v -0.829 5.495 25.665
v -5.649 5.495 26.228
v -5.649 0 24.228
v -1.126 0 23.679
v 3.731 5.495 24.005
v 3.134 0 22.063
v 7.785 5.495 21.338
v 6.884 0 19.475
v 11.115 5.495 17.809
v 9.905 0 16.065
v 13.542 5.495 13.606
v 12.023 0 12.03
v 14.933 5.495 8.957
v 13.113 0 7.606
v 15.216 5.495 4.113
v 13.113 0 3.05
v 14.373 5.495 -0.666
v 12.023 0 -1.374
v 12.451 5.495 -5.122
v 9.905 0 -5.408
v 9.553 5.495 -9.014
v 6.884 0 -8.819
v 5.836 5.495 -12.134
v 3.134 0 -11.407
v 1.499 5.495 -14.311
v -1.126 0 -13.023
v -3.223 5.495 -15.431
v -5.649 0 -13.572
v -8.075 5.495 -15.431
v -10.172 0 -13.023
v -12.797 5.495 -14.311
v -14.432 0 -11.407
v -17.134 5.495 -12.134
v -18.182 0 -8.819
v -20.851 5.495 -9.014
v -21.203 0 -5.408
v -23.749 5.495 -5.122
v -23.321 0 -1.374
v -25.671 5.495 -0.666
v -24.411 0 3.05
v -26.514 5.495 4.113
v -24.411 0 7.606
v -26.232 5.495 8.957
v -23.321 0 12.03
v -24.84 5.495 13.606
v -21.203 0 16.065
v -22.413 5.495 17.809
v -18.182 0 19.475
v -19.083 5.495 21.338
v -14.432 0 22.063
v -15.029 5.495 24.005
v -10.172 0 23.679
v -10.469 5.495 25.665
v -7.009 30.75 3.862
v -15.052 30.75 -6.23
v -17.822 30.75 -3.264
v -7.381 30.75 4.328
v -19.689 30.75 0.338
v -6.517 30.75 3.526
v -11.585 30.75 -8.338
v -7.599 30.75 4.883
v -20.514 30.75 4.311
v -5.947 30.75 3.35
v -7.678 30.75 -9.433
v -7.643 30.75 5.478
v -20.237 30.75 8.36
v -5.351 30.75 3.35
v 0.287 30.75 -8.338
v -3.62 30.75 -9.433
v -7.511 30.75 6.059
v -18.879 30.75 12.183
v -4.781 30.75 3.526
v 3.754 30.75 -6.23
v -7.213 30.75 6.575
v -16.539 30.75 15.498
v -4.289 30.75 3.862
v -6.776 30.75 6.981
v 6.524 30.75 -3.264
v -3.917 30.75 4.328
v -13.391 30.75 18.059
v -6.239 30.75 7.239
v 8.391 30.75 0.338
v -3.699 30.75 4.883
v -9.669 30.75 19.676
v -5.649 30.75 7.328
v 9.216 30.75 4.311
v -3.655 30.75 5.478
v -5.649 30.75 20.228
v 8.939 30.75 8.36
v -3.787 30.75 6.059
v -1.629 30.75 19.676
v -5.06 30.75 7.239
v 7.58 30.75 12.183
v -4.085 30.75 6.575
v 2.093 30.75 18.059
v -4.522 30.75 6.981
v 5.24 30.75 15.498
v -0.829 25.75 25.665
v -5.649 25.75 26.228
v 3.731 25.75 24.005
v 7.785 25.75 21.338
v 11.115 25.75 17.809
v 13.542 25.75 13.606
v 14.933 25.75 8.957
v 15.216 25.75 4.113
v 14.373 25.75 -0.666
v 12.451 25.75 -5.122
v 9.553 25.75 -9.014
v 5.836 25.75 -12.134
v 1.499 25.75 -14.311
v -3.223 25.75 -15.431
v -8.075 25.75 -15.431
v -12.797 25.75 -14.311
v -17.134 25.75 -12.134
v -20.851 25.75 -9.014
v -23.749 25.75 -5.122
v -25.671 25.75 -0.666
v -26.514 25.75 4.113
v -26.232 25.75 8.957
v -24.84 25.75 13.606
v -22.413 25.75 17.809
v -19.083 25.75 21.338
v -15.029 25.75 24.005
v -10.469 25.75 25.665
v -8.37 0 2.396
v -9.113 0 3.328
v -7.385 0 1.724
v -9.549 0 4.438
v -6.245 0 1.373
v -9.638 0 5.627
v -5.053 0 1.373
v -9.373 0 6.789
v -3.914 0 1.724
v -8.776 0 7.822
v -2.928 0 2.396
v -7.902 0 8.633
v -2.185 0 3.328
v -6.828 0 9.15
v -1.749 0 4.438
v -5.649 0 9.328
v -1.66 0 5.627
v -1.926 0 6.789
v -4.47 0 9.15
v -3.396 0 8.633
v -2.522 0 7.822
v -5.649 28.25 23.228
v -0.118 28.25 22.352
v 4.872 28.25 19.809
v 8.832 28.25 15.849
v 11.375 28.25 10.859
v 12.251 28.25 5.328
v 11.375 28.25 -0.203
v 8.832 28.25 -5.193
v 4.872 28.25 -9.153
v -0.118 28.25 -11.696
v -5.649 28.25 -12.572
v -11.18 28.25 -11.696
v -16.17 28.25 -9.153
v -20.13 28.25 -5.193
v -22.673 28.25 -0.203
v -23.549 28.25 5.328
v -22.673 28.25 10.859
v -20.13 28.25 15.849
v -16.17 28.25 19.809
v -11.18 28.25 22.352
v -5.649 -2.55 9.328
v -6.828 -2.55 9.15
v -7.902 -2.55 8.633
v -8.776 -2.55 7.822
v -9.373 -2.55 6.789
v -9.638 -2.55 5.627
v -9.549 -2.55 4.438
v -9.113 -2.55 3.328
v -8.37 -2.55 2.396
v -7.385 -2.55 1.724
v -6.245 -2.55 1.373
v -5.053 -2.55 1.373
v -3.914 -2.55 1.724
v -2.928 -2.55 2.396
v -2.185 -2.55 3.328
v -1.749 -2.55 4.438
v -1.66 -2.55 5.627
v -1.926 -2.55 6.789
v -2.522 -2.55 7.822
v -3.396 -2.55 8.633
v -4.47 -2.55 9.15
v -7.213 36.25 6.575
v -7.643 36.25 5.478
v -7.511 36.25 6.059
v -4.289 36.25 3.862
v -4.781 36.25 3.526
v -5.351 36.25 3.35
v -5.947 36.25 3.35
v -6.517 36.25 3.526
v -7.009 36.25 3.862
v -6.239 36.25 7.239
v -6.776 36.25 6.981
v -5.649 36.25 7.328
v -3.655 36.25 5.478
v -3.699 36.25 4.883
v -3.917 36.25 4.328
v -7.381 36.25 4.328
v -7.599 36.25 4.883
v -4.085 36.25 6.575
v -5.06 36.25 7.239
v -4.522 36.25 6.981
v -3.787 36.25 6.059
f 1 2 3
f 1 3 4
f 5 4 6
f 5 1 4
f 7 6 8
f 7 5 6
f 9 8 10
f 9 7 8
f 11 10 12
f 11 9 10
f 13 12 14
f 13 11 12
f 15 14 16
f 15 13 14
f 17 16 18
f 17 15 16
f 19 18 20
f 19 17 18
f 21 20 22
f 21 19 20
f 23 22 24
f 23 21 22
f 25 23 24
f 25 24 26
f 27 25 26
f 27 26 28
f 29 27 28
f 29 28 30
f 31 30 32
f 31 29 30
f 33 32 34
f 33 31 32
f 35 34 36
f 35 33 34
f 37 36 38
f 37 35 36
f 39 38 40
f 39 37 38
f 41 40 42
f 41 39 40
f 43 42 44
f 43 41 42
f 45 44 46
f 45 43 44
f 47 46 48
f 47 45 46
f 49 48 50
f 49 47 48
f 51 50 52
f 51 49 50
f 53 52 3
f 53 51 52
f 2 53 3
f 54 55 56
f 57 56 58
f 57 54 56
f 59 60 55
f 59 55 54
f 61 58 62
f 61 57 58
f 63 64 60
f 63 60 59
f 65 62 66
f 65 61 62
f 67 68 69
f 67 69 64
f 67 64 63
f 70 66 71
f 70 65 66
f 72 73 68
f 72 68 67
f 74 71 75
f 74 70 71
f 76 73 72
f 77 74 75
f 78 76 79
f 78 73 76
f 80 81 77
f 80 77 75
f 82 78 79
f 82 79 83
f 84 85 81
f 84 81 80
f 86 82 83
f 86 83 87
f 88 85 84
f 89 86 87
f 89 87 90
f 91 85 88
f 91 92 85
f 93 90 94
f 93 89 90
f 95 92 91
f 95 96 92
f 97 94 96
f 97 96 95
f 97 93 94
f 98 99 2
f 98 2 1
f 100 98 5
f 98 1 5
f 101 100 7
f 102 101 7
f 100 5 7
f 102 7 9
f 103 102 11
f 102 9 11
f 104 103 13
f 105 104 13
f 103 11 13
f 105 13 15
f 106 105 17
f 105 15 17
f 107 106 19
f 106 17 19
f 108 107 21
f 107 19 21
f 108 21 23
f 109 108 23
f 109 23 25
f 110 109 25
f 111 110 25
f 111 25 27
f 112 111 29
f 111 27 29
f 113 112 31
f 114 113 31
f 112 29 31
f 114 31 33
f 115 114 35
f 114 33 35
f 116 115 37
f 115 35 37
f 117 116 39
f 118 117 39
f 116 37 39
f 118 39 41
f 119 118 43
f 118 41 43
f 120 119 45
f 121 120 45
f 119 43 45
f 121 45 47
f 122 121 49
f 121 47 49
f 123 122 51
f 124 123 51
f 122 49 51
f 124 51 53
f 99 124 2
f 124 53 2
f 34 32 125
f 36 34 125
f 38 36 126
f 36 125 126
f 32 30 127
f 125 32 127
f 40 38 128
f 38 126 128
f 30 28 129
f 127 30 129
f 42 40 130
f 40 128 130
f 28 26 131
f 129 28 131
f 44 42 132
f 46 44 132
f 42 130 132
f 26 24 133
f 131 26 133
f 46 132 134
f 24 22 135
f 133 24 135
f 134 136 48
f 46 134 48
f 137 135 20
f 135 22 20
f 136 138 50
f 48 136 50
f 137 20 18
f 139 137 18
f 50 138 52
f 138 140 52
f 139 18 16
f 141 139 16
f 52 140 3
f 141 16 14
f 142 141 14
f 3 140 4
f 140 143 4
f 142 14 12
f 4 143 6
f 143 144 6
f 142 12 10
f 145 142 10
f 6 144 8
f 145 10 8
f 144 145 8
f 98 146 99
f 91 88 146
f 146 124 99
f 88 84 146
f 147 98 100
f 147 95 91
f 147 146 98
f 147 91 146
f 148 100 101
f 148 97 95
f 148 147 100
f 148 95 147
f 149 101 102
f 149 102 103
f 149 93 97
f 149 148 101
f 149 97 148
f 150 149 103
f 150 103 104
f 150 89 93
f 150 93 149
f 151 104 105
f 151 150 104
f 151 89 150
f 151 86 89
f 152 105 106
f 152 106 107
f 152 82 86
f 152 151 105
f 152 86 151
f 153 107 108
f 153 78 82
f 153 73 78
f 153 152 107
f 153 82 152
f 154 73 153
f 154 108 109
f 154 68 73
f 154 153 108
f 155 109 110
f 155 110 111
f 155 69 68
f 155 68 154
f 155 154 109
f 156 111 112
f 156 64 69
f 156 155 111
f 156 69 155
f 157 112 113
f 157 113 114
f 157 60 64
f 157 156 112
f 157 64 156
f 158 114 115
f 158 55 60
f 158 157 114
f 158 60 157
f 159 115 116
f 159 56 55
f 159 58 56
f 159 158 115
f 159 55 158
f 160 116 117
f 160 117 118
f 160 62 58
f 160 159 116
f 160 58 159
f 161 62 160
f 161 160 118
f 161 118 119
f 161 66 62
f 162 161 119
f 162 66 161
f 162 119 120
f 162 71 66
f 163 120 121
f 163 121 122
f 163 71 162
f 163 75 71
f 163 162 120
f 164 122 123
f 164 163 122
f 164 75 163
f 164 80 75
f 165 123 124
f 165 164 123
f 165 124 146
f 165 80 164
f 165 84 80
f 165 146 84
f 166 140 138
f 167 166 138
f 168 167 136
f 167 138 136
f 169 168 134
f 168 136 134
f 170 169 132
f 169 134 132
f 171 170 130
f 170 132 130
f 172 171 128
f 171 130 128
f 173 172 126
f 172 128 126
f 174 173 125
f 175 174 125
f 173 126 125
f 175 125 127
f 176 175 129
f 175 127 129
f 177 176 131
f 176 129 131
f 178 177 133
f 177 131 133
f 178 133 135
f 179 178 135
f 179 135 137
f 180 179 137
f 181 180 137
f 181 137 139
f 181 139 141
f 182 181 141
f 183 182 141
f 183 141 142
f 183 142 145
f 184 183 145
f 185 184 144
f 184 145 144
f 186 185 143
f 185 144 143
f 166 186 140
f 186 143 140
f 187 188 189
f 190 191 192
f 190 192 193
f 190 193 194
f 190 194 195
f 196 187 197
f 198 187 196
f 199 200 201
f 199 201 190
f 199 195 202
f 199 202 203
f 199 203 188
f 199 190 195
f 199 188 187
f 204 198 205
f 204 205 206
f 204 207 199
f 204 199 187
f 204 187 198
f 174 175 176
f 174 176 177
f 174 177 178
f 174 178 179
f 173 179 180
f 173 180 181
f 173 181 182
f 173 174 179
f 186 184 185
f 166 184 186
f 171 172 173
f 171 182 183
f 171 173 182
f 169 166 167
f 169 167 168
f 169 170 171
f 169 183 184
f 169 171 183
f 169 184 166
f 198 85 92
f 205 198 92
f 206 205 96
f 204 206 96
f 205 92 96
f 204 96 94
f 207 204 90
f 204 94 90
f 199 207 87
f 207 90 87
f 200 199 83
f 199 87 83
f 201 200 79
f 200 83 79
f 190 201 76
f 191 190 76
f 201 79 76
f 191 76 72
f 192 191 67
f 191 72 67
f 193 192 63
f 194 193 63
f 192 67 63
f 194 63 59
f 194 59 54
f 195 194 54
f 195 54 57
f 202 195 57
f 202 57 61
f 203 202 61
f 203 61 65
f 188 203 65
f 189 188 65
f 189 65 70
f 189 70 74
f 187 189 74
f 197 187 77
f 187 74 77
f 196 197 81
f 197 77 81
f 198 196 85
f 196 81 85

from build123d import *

# Parameters (mm, degrees)
SKETCH1_R           = 20.9
BOSS_EXTRUDE1_DEPTH = 30.75
CHAMFER1_SIZE       = 5
CHAMFER1_SIZE2      = 6
CHAMFER2_SIZE       = 2
CHAMFER2_SIZE2      = 5.494954839
SKETCH2_R           = 2
BOSS_EXTRUDE2_DEPTH = 5.5
SKETCH3_R           = 4
BOSS_EXTRUDE3_DEPTH = 2.55


with BuildPart() as part:
    # Sketch1 → Boss-Extrude1 (new body)
    with BuildSketch(Plane(origin=(0, 0, 0), x_dir=(1, 0, 0), z_dir=(0, 1, 0))):
        with Locations(Location((-5.649057894, -5.328088696, 0), (0, 0, 270))):
            Circle(SKETCH1_R)
    extrude(amount=BOSS_EXTRUDE1_DEPTH)

    # Chamfer1
    chamfer1_edges = [part.edges().sort_by_distance(p)[0] for p in [
        (-5.649057894, 30.75, -15.571911304),
    ]]
    chamfer1_side = [part.faces().sort_by_distance(p)[0] for p in [
        (-5.649057894, 15.375, -15.571911304),
    ]]
    chamfer(chamfer1_edges, length=CHAMFER1_SIZE, length2=CHAMFER1_SIZE2, reference=chamfer1_side[0])

    # Chamfer2
    chamfer2_edges = [part.edges().sort_by_distance(p)[0] for p in [
        (-5.649057894, 0, -15.571911304),
    ]]
    chamfer2_side = [part.faces().sort_by_distance(p)[0] for p in [
        (-5.649057894, 0, 5.328088696),
    ]]
    chamfer(chamfer2_edges, length=CHAMFER2_SIZE, length2=CHAMFER2_SIZE2, reference=chamfer2_side[0])

    # Sketch2 → Boss-Extrude2 (add)
    with BuildSketch(Plane(origin=(0, 30.75, 0), x_dir=(1, 0, 0), z_dir=(0, 1, 0))):
        with Locations(Location((-5.649057894, -5.328088696, 0), (0, 0, 270))):
            Circle(SKETCH2_R)
    extrude(amount=BOSS_EXTRUDE2_DEPTH)

    # Sketch3 → Boss-Extrude3 (add)
    with BuildSketch(Plane.XZ):
        with Locations(Location((-5.649057894, 5.328088696, 0), (0, 0, 90))):
            Circle(SKETCH3_R)
    extrude(amount=BOSS_EXTRUDE3_DEPTH)


solid = part.part
